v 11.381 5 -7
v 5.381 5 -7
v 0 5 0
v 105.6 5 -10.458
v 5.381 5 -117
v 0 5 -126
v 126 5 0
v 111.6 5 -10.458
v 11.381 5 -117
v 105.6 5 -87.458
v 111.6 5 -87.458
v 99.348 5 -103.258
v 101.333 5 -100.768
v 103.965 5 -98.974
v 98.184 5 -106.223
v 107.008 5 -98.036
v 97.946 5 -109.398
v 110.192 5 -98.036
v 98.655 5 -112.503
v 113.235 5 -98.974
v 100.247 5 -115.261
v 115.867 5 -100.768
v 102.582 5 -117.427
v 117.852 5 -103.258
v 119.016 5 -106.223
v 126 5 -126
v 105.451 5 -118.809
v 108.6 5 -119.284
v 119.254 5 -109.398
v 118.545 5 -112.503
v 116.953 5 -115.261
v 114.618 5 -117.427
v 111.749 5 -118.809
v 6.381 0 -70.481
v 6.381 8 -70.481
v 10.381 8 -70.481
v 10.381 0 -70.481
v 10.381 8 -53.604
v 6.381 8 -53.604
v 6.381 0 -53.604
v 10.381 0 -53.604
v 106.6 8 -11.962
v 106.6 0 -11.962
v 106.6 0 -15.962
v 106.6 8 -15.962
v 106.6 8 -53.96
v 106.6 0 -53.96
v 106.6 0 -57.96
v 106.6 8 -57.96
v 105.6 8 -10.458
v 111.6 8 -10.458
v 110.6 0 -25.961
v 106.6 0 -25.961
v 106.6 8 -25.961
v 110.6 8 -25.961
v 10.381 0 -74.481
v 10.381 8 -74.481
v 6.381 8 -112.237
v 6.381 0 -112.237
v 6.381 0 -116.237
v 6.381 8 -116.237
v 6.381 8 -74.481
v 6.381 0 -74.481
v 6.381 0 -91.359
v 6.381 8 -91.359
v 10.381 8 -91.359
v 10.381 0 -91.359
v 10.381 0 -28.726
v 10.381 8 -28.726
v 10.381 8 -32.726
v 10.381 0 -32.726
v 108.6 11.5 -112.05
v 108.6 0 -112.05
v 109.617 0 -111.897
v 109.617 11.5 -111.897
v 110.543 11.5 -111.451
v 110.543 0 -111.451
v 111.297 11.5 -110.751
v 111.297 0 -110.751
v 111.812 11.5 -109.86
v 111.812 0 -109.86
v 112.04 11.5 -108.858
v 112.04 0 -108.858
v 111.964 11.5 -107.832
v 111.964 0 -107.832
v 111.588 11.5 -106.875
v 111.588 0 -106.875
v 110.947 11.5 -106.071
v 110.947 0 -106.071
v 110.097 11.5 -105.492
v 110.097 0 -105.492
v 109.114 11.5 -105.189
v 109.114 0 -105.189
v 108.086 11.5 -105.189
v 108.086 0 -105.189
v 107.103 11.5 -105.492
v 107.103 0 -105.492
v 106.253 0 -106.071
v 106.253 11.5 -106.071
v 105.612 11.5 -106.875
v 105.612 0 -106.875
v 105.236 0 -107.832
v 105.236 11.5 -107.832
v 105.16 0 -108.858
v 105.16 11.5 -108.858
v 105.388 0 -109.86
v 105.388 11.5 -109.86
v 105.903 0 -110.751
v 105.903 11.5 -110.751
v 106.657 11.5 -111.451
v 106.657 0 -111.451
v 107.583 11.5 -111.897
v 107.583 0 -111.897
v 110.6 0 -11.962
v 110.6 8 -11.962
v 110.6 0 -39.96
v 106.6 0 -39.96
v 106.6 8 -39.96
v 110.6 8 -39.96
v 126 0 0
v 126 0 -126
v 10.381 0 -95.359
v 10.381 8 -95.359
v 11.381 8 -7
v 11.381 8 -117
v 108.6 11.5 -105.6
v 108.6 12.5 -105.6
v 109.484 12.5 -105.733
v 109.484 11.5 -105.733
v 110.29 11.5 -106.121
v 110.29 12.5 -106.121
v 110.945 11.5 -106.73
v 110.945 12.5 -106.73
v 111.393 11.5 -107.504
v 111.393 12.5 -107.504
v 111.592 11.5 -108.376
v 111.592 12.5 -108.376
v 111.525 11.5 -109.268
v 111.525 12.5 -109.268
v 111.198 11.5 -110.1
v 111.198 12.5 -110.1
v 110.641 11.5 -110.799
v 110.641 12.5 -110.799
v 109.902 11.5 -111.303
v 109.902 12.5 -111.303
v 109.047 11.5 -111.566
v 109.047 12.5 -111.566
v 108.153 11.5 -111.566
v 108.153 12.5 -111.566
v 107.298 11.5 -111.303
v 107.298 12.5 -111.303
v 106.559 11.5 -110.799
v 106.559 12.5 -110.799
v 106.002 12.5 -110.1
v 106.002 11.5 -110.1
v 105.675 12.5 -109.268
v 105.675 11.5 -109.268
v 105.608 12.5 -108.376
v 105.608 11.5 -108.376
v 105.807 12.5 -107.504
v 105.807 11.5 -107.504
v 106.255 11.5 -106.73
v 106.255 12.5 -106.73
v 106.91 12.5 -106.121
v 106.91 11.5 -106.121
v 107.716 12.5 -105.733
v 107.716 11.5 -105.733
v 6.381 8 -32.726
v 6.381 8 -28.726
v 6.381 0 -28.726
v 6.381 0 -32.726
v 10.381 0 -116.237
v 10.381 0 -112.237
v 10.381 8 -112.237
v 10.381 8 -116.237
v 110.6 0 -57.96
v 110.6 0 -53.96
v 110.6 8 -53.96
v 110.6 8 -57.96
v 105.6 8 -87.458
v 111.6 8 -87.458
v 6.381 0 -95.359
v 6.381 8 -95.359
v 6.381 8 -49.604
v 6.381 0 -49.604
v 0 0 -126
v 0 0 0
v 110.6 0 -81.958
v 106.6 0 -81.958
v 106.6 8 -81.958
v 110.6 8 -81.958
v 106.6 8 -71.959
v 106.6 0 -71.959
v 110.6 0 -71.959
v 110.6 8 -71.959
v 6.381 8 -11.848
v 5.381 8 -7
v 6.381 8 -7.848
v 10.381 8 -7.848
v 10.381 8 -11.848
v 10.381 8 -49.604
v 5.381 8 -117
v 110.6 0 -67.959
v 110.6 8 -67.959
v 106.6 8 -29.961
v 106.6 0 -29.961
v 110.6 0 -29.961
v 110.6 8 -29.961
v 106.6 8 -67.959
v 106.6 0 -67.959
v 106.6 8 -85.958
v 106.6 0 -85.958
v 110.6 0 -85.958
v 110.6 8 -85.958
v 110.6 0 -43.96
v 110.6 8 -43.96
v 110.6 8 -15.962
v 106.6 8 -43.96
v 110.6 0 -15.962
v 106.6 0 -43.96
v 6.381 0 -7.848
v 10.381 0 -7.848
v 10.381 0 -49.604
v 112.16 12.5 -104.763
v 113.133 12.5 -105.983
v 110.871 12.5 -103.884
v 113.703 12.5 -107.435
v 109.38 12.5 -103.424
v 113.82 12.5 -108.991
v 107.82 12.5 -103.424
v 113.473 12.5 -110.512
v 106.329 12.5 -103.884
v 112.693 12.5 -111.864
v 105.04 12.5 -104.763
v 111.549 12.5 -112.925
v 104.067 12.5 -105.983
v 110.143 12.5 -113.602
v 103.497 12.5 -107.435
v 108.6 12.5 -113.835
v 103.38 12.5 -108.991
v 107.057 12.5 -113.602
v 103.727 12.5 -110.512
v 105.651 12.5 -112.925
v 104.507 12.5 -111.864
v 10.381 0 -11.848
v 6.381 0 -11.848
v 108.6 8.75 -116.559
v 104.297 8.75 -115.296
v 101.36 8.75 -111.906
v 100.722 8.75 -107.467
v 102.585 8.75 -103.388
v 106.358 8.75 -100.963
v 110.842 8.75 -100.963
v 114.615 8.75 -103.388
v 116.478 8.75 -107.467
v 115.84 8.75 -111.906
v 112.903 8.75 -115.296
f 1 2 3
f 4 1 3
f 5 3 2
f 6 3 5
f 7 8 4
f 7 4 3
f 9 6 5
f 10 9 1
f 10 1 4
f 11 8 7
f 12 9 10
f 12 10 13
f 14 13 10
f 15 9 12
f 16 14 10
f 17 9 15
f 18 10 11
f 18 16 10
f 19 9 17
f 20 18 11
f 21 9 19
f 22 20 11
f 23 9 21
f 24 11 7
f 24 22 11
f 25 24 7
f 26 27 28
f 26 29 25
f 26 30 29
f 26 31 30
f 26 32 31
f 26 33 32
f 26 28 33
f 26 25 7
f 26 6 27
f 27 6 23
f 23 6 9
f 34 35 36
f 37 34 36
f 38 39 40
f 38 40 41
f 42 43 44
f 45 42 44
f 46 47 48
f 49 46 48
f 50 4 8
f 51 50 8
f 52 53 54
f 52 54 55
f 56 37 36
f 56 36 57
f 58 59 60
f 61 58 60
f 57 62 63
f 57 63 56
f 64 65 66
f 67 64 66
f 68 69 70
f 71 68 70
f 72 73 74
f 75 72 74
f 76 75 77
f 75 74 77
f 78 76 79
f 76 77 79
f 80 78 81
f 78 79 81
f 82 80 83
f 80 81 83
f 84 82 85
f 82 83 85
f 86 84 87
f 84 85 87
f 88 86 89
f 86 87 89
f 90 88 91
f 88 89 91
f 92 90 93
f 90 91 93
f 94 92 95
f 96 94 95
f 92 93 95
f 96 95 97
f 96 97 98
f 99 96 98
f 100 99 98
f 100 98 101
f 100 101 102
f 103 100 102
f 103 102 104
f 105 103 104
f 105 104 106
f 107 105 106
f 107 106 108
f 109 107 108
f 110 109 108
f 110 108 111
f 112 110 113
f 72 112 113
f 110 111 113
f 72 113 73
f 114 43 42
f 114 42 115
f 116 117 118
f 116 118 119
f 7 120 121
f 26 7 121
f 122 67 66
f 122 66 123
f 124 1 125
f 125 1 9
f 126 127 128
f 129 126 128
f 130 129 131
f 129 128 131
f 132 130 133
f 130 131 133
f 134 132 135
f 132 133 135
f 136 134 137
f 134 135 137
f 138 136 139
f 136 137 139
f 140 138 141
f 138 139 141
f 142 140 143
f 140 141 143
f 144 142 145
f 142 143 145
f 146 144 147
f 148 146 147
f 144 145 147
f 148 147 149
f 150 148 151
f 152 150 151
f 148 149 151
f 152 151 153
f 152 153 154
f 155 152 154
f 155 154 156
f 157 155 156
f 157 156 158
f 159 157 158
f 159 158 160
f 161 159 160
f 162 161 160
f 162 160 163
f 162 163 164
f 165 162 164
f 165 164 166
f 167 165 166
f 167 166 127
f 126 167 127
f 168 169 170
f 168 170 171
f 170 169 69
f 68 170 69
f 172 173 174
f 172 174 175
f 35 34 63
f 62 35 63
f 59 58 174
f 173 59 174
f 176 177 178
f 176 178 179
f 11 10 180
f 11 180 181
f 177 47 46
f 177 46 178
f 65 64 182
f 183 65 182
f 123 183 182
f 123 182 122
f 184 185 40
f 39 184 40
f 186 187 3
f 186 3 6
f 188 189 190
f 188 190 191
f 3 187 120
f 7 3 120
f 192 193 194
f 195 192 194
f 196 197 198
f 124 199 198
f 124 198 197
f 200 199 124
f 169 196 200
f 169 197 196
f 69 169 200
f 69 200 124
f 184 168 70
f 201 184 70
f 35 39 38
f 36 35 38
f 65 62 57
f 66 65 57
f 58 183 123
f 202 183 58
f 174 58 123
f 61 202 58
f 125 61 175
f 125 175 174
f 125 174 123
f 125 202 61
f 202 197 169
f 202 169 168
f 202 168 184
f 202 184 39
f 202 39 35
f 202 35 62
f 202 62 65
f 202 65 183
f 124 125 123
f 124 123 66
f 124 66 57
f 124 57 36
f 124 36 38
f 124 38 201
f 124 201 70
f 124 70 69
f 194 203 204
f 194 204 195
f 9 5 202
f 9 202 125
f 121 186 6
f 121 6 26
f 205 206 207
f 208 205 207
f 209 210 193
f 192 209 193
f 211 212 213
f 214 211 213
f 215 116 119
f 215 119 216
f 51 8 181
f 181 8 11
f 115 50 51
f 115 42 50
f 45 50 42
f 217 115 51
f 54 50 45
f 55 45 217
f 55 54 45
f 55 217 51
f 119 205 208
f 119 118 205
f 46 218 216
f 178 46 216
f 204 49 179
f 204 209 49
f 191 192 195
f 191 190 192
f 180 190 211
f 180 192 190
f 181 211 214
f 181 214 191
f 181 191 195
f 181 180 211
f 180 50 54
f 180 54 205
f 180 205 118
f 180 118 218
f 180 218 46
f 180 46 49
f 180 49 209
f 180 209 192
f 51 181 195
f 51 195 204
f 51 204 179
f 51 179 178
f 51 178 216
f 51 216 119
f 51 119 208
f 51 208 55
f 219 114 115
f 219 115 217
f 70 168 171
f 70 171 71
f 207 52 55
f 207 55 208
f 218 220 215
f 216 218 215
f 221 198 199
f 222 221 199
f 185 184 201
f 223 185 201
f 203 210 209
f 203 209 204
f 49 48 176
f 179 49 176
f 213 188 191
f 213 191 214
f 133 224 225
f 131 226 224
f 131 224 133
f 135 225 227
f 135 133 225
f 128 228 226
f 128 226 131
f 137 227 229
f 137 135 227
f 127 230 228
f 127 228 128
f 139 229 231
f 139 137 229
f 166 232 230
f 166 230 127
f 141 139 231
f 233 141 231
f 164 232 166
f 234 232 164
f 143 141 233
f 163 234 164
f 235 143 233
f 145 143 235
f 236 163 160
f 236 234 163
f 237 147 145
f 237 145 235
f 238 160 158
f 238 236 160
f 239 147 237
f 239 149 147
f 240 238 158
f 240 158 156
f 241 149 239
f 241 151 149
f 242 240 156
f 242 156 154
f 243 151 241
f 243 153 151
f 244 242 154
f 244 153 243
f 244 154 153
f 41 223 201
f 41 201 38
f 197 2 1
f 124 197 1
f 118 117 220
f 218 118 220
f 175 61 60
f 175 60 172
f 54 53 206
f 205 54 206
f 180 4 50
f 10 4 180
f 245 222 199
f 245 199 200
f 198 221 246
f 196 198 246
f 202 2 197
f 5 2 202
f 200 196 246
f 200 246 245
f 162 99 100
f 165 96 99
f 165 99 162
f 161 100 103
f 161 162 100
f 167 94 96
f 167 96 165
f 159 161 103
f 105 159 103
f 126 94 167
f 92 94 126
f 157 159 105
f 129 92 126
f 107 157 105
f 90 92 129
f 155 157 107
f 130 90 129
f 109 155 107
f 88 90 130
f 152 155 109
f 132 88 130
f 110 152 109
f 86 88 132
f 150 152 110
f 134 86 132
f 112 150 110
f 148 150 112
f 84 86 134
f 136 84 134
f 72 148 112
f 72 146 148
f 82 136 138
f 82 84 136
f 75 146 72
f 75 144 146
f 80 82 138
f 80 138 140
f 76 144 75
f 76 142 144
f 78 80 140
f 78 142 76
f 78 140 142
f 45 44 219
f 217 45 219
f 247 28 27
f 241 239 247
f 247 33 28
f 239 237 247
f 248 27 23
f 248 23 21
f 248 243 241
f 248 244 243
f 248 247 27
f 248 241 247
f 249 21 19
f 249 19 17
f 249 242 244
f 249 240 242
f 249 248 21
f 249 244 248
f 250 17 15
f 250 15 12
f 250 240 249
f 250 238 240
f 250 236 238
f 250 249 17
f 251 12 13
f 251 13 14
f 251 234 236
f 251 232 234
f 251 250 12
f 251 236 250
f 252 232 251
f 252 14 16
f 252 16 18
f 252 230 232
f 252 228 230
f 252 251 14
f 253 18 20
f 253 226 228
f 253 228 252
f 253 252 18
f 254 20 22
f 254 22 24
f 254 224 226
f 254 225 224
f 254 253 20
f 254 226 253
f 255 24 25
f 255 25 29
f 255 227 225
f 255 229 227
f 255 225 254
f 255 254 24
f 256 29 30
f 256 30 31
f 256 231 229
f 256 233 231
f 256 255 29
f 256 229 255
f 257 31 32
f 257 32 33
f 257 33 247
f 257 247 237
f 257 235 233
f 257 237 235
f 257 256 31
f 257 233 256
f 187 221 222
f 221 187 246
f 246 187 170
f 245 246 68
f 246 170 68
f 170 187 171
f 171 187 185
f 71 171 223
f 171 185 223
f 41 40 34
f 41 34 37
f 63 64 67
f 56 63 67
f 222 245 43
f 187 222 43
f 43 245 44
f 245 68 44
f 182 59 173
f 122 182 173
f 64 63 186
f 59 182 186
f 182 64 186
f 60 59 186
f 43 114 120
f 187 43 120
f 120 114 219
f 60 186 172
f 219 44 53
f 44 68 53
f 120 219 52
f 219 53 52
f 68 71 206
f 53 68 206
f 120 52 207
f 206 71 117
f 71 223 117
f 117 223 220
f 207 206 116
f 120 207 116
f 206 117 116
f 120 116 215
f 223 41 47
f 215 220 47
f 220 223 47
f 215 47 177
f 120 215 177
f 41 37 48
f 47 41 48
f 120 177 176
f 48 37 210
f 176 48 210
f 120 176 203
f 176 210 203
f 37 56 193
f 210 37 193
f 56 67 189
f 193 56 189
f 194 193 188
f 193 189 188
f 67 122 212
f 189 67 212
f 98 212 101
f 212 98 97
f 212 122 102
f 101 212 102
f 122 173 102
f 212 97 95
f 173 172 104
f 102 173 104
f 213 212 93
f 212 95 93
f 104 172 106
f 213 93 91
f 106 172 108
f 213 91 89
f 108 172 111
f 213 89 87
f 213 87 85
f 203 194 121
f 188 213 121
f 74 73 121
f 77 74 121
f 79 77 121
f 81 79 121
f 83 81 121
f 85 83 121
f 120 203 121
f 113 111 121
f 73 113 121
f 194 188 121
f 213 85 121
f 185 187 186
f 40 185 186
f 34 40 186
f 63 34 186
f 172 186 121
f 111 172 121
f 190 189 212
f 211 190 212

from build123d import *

# Parameters (mm, degrees)
SKETCH1_W           = 126
SKETCH1_H           = 126
BOSS_EXTRUDE1_DEPTH = 5
SKETCH3_R           = 12.5
BOSS_EXTRUDE2_DEPTH = 7.5
SKETCH4_R           = 3.45
CUT_EXTRUDE1_DEPTH  = 11.5
SKETCH6_R           = 3
CUT_EXTRUDE2_DEPTH  = 179.628805068
CHAMFER1_SIZE       = 10
CHAMFER1_SIZE_2     = 7.26542528
SKETCH9_W           = 6
SKETCH9_H           = 77
BOSS_EXTRUDE4_DEPTH = 3
SKETCH10_W          = 4
SKETCH10_H          = 4
CUT_EXTRUDE4_DEPTH  = 179.370401132
SKETCH11_W          = 6
SKETCH11_H          = 110
BOSS_EXTRUDE5_DEPTH = 3
SKETCH12_W          = 4
SKETCH12_H          = 4
CUT_EXTRUDE5_DEPTH  = 179.370401132


with BuildPart() as part:
    # Sketch1 → Boss-Extrude1 (new body)
    with BuildSketch(Plane(origin=(0, 0, 0), x_dir=(1, 0, 0), z_dir=(0, 1, 0))):
        with Locations((63, 63)):
            Rectangle(SKETCH1_W, SKETCH1_H)
    extrude(amount=BOSS_EXTRUDE1_DEPTH)

    # Sketch3 → Boss-Extrude2 (add)
    with BuildSketch(Plane(origin=(0, 5, 0), x_dir=(1, 0, 0), z_dir=(0, 1, 0))):
        with Locations(Location((108.6, 108.6, 0), (0, 0, 90))):
            Circle(SKETCH3_R)
    extrude(amount=BOSS_EXTRUDE2_DEPTH)

    # Sketch4 → Cut-Extrude1 (cut)
    with BuildSketch(Plane.XZ):
        with Locations(Location((108.6, -108.6, 0), (0, 0, 270))):
            Circle(SKETCH4_R)
    extrude(amount=-CUT_EXTRUDE1_DEPTH, mode=Mode.SUBTRACT)

    # Sketch6 → Cut-Extrude2 (cut, through all)
    with BuildSketch(Plane(origin=(0, 12.5, 0), x_dir=(1, 0, 0), z_dir=(0, 1, 0))):
        with Locations(Location((108.6, 108.6, 0), (0, 0, 270))):
            Circle(SKETCH6_R)
    extrude(amount=-CUT_EXTRUDE2_DEPTH, mode=Mode.SUBTRACT)

    # Chamfer1
    # the kernel refuses this chamfer: 10, 7.26542528 mm, written as the material it takes off along each edge
    with BuildSketch(Plane(origin=(108.6, 12.5, -108.6), x_dir=(0, 0, -1), z_dir=(1, 0, 0))) as chamfer1_piece_1_section:
        Polygon((12.5, -CHAMFER1_SIZE), (12.5 - CHAMFER1_SIZE_2, 0), (12.5, 0), align=None)
    chamfer1_piece_1 = revolve(axis=Axis((108.6, 12.5, -108.6), (0, 1, 0)), mode=Mode.PRIVATE)
    chamfer1_piece_1 = split(chamfer1_piece_1, bisect_by=Plane(origin=(108.6, 5, -100.650989912), z_dir=(0, 1, 0)), keep=Keep.TOP, mode=Mode.PRIVATE)
    add(chamfer1_piece_1, mode=Mode.SUBTRACT)

    # Sketch9 → Boss-Extrude4 (add)
    with BuildSketch(Plane(origin=(0, 5, 0), x_dir=(1, 0, 0), z_dir=(0, 1, 0))):
        with Locations((108.6, 48.95817816)):
            Rectangle(SKETCH9_W, SKETCH9_H)
    extrude(amount=BOSS_EXTRUDE4_DEPTH)

    # Sketch10 → Cut-Extrude4 (cut, through all)
    with BuildSketch(Plane(origin=(0, 8, 0), x_dir=(1, 0, 0), z_dir=(0, 1, 0))):
        with Locations((108.6, 83.95817816)):
            Rectangle(SKETCH10_W, SKETCH10_H)
        with Locations((108.6, 69.958932274)):
            Rectangle(SKETCH10_W, SKETCH10_H)
        with Locations((108.6, 55.959686388)):
            Rectangle(SKETCH10_W, SKETCH10_H)
        with Locations((108.6, 41.960440502)):
            Rectangle(SKETCH10_W, SKETCH10_H)
        with Locations((108.6, 27.961194616)):
            Rectangle(SKETCH10_W, SKETCH10_H)
        with Locations((108.6, 13.96194873)):
            Rectangle(SKETCH10_W, SKETCH10_H)
    extrude(amount=-CUT_EXTRUDE4_DEPTH, mode=Mode.SUBTRACT)

    # Sketch11 → Boss-Extrude5 (add)
    with BuildSketch(Plane(origin=(0, 5, 0), x_dir=(1, 0, 0), z_dir=(0, 1, 0))):
        with Locations((8.381061813, 62)):
            Rectangle(SKETCH11_W, SKETCH11_H)
    extrude(amount=BOSS_EXTRUDE5_DEPTH)

    # Sketch12 → Cut-Extrude5 (cut, through all)
    with BuildSketch(Plane(origin=(0, 8, 0), x_dir=(1, 0, 0), z_dir=(0, 1, 0))):
        with Locations((8.381061813, 114.236582212)):
            Rectangle(SKETCH12_W, SKETCH12_H)
        with Locations((8.381061813, 93.358892092)):
            Rectangle(SKETCH12_W, SKETCH12_H)
        with Locations((8.381061813, 72.481201972)):
            Rectangle(SKETCH12_W, SKETCH12_H)
        with Locations((8.381061813, 51.603511852)):
            Rectangle(SKETCH12_W, SKETCH12_H)
        with Locations((8.381061813, 30.725821731)):
            Rectangle(SKETCH12_W, SKETCH12_H)
        with Locations((8.381061813, 9.848131611)):
            Rectangle(SKETCH12_W, SKETCH12_H)
    extrude(amount=-CUT_EXTRUDE5_DEPTH, mode=Mode.SUBTRACT)


solid = part.part
